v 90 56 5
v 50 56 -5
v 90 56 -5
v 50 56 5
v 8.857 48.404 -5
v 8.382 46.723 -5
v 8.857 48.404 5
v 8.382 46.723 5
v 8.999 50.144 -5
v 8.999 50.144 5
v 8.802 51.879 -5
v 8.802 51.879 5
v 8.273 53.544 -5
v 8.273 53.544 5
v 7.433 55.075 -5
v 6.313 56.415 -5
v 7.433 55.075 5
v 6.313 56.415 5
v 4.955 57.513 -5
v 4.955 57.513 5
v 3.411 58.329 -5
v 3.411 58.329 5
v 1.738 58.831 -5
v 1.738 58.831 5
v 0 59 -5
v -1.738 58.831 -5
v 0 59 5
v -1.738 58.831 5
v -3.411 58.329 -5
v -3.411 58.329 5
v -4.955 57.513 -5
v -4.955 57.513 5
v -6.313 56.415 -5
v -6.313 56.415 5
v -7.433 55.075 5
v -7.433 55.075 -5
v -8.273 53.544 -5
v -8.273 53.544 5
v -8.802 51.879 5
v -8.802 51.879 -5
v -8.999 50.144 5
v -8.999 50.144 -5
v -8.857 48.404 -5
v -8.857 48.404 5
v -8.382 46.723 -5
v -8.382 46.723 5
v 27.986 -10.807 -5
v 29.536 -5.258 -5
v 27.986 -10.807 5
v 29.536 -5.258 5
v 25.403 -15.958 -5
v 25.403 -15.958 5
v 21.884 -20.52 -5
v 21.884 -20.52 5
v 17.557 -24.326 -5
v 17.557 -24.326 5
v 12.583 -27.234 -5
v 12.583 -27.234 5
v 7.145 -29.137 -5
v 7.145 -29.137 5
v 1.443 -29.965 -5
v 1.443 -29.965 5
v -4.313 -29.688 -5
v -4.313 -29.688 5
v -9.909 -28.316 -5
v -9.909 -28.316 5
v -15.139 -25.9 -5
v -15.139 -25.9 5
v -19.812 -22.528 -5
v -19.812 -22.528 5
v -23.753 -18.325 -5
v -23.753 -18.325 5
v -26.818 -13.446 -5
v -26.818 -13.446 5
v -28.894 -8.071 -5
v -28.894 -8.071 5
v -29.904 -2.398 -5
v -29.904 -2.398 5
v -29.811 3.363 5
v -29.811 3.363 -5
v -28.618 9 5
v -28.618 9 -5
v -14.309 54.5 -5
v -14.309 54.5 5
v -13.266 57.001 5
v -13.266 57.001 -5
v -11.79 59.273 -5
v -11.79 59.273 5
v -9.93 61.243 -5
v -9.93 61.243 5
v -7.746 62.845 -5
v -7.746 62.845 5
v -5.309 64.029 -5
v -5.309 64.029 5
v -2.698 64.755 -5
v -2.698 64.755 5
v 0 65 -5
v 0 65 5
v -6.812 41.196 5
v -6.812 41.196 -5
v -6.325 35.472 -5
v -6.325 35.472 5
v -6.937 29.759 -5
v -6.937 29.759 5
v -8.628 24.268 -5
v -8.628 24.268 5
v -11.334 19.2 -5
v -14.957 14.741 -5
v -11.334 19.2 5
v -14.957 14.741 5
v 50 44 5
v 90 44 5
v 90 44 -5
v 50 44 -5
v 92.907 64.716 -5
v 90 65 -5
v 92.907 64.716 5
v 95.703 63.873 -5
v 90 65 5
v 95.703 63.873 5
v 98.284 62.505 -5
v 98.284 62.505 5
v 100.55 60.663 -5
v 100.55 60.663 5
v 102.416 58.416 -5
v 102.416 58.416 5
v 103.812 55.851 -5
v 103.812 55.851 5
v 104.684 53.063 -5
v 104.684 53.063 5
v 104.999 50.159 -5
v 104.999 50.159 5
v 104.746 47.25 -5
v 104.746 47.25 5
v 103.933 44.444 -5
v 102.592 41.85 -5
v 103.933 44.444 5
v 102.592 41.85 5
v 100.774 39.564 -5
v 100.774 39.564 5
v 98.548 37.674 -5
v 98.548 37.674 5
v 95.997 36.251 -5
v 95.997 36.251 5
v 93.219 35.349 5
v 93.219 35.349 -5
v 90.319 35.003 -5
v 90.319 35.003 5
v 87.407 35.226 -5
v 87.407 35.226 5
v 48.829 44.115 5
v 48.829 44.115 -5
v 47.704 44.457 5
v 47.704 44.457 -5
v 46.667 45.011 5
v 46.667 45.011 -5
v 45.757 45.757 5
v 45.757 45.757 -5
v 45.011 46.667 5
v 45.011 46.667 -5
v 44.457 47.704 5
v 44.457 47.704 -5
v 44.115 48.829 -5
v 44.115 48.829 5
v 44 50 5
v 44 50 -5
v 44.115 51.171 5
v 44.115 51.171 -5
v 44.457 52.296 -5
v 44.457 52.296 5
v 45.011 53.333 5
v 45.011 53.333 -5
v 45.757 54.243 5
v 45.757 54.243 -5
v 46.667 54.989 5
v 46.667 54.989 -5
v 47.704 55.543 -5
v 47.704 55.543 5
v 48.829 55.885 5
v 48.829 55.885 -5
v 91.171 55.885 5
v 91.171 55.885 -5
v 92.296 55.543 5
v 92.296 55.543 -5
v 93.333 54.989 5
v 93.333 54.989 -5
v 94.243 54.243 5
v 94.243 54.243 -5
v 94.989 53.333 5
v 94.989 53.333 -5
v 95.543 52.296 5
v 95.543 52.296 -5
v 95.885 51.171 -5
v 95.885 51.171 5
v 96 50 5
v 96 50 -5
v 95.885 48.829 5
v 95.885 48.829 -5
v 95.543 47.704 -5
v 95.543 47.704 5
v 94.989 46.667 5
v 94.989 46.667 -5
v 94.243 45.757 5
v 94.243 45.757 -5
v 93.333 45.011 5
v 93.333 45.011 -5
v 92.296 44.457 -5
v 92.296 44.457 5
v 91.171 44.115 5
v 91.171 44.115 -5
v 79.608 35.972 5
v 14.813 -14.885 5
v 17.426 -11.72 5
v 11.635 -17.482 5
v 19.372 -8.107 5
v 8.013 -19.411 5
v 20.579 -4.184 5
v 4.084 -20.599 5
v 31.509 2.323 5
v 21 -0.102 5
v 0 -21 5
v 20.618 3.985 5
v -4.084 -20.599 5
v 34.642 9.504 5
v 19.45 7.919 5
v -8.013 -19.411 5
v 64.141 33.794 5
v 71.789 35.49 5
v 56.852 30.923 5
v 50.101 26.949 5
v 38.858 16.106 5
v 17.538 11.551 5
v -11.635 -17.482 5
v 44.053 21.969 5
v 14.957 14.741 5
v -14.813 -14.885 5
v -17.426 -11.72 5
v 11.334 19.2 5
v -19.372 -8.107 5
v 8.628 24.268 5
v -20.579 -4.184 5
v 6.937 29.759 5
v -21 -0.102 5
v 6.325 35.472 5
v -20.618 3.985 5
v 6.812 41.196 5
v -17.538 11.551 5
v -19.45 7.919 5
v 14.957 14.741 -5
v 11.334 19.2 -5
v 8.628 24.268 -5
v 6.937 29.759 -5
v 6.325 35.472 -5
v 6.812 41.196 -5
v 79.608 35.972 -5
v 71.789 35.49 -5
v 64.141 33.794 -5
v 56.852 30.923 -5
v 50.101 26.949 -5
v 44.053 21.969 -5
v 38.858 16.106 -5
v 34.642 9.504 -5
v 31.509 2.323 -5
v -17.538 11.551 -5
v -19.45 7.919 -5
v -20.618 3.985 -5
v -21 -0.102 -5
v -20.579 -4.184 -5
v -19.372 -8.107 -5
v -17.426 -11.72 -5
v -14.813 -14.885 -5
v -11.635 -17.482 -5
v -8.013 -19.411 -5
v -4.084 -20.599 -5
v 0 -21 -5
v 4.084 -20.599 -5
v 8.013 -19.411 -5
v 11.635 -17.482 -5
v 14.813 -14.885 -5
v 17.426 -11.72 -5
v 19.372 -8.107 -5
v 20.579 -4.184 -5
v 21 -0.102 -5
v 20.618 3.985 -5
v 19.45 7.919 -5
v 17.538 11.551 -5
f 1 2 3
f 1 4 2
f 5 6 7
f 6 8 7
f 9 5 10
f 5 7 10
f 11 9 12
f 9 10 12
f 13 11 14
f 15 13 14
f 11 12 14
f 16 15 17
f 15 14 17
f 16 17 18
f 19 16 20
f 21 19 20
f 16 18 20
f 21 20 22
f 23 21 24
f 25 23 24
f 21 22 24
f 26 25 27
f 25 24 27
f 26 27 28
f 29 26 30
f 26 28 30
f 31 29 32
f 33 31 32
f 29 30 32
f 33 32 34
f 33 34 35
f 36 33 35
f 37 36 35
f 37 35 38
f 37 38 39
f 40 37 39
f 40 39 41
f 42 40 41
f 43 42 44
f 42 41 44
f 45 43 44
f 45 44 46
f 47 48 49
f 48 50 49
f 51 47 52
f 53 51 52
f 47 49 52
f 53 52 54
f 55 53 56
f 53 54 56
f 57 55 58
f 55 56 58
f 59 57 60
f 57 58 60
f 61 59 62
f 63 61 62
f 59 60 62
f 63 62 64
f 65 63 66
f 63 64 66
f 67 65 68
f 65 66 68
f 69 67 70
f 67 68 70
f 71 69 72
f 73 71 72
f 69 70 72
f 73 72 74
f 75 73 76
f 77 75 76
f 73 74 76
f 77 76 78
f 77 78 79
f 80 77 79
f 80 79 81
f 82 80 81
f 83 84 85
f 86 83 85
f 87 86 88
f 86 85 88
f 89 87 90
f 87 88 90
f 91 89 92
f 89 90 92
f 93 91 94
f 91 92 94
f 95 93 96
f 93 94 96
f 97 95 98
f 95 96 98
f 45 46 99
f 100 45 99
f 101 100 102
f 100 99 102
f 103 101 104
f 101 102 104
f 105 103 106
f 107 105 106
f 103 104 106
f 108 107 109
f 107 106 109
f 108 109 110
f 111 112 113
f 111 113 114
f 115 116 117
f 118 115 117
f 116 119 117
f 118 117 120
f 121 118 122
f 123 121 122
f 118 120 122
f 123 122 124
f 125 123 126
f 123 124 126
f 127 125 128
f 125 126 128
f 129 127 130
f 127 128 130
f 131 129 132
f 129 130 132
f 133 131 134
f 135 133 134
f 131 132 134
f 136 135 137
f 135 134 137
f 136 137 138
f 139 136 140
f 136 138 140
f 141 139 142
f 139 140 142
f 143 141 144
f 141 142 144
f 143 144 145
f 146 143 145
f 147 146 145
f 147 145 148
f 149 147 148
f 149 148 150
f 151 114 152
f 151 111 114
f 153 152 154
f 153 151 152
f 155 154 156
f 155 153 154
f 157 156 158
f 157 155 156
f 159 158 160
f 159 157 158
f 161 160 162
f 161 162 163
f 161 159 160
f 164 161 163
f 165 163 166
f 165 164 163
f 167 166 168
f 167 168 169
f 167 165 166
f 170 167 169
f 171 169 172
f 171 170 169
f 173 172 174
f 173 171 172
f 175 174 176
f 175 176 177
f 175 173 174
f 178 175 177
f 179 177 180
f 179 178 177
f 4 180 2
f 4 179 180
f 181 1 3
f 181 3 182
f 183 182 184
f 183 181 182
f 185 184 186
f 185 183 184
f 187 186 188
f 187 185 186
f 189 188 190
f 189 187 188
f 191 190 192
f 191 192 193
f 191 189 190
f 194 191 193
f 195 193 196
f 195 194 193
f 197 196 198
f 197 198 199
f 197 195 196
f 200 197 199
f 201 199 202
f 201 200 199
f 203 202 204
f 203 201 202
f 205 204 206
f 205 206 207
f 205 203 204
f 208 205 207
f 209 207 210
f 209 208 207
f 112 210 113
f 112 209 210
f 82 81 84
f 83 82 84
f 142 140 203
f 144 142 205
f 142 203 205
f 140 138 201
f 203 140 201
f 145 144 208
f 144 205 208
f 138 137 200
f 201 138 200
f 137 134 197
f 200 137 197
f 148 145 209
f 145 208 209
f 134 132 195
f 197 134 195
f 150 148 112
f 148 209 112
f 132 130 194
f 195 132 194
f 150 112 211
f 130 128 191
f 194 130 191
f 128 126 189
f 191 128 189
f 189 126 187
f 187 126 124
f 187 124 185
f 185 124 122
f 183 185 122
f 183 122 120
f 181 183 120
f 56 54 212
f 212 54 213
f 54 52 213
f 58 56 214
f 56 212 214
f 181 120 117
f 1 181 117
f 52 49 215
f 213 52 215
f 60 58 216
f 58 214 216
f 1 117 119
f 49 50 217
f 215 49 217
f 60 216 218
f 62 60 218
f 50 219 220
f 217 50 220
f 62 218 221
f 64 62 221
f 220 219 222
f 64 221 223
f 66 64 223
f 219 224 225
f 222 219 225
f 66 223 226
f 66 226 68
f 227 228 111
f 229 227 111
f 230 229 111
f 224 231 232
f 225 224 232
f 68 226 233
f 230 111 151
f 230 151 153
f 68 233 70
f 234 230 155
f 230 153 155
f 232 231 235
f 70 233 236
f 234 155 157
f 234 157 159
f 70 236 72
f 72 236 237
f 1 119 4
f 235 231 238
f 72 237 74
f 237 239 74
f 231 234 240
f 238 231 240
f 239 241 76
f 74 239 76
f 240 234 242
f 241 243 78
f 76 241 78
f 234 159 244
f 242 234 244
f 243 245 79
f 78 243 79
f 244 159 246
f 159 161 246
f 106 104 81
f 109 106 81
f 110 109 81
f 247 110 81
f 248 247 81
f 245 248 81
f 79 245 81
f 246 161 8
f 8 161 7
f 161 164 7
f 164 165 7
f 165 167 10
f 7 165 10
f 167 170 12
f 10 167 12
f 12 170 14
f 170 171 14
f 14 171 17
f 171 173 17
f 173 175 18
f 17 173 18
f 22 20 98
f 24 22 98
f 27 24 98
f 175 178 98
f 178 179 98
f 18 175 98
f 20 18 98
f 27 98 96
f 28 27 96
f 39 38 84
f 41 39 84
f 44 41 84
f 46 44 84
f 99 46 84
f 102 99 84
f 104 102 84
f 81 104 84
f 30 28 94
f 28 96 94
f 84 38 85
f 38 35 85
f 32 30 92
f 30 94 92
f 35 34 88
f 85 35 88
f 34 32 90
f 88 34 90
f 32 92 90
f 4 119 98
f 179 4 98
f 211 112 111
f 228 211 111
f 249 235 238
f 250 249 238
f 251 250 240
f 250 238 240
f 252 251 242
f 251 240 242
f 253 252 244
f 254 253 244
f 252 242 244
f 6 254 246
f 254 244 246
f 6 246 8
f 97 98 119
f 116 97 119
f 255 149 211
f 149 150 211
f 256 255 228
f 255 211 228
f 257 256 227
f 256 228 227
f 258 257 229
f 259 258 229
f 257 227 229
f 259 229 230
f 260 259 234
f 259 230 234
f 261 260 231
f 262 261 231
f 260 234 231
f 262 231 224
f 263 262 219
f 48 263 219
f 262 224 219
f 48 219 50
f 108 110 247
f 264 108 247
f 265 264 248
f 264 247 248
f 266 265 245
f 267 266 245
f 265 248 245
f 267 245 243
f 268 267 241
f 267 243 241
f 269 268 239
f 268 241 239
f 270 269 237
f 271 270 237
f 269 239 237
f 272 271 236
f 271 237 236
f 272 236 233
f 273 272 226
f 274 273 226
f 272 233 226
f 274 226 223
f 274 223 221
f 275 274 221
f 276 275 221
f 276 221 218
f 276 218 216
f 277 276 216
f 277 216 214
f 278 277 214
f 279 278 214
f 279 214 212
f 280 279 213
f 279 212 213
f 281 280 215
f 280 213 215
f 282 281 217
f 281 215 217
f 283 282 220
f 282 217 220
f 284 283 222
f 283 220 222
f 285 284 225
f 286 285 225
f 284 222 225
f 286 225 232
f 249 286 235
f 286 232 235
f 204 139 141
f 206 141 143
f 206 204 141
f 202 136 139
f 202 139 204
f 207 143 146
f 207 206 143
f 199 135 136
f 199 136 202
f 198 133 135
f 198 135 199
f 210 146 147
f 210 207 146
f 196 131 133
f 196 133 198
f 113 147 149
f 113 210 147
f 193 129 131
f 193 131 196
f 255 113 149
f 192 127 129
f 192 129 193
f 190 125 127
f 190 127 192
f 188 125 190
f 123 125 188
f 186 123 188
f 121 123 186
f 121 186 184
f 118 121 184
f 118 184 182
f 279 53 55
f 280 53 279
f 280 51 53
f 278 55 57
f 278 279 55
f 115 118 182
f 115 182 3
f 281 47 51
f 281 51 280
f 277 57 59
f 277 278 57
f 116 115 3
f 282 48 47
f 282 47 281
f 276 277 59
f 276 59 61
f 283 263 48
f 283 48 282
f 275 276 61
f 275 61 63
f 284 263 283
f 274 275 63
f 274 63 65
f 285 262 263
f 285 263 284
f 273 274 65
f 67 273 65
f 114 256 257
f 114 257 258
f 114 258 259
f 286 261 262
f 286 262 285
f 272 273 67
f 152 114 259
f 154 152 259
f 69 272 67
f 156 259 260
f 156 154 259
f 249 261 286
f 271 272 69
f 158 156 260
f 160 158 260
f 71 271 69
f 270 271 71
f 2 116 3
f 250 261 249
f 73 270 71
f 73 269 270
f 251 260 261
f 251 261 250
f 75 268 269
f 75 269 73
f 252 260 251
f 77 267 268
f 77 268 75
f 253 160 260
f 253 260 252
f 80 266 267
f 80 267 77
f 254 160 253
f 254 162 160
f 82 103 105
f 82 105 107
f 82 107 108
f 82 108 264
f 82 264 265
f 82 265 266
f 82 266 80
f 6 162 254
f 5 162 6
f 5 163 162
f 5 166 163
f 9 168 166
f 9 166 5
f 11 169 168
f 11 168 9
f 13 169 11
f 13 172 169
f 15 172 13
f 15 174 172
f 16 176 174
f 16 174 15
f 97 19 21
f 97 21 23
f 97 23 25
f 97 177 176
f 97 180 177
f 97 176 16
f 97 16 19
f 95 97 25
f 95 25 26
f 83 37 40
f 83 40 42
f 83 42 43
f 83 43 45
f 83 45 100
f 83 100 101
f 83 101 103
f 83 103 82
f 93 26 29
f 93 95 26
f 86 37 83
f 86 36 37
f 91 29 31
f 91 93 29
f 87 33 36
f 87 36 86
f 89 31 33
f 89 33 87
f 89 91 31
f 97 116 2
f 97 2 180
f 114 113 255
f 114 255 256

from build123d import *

# Parameters (mm, degrees)
BOSS_EXTRUDE1_DEPTH = 5


with BuildPart() as part:
    # Sketch1 → Boss-Extrude1 (new, symmetric)
    with BuildSketch(Plane.XY):
        with BuildLine():
            Line((0, 65), (90, 65))
            ThreePointArc((90, 65), (104.943418217, 48.698365648), (87.406551135, 35.225900265))
            ThreePointArc((87.406551135, 35.225900265), (50.100874494, 26.949083525), (29.535645594, -5.25791207))
            ThreePointArc((29.535645594, -5.25791207), (-7.143700144, -29.137047693), (-28.618176043, 9))
            Line((-28.618176043, 9), (-14.309088021, 54.5))
            ThreePointArc((-14.309088021, 54.5), (-8.874119675, 62.093386622), (0, 65))
        make_face()
        with BuildLine():
            Line((50, 56), (90, 56))
            ThreePointArc((90, 56), (96, 50), (90, 44))
            Line((90, 44), (50, 44))
            ThreePointArc((50, 44), (44, 50), (50, 56))
        make_face(mode=Mode.SUBTRACT)
        with BuildLine():
            ThreePointArc((8.382229724, 46.723076923), (0, 59), (-8.382229724, 46.723076923))
            ThreePointArc((-8.382229724, 46.723076923), (-6.937432482, 29.759413292), (-14.956527547, 14.741176471))
            ThreePointArc((-14.956527547, 14.741176471), (0, -21), (14.956527547, 14.741176471))
            ThreePointArc((14.956527547, 14.741176471), (6.937432482, 29.759413292), (8.382229724, 46.723076923))
        make_face(mode=Mode.SUBTRACT)
    extrude(amount=BOSS_EXTRUDE1_DEPTH, both=True)


solid = part.part
